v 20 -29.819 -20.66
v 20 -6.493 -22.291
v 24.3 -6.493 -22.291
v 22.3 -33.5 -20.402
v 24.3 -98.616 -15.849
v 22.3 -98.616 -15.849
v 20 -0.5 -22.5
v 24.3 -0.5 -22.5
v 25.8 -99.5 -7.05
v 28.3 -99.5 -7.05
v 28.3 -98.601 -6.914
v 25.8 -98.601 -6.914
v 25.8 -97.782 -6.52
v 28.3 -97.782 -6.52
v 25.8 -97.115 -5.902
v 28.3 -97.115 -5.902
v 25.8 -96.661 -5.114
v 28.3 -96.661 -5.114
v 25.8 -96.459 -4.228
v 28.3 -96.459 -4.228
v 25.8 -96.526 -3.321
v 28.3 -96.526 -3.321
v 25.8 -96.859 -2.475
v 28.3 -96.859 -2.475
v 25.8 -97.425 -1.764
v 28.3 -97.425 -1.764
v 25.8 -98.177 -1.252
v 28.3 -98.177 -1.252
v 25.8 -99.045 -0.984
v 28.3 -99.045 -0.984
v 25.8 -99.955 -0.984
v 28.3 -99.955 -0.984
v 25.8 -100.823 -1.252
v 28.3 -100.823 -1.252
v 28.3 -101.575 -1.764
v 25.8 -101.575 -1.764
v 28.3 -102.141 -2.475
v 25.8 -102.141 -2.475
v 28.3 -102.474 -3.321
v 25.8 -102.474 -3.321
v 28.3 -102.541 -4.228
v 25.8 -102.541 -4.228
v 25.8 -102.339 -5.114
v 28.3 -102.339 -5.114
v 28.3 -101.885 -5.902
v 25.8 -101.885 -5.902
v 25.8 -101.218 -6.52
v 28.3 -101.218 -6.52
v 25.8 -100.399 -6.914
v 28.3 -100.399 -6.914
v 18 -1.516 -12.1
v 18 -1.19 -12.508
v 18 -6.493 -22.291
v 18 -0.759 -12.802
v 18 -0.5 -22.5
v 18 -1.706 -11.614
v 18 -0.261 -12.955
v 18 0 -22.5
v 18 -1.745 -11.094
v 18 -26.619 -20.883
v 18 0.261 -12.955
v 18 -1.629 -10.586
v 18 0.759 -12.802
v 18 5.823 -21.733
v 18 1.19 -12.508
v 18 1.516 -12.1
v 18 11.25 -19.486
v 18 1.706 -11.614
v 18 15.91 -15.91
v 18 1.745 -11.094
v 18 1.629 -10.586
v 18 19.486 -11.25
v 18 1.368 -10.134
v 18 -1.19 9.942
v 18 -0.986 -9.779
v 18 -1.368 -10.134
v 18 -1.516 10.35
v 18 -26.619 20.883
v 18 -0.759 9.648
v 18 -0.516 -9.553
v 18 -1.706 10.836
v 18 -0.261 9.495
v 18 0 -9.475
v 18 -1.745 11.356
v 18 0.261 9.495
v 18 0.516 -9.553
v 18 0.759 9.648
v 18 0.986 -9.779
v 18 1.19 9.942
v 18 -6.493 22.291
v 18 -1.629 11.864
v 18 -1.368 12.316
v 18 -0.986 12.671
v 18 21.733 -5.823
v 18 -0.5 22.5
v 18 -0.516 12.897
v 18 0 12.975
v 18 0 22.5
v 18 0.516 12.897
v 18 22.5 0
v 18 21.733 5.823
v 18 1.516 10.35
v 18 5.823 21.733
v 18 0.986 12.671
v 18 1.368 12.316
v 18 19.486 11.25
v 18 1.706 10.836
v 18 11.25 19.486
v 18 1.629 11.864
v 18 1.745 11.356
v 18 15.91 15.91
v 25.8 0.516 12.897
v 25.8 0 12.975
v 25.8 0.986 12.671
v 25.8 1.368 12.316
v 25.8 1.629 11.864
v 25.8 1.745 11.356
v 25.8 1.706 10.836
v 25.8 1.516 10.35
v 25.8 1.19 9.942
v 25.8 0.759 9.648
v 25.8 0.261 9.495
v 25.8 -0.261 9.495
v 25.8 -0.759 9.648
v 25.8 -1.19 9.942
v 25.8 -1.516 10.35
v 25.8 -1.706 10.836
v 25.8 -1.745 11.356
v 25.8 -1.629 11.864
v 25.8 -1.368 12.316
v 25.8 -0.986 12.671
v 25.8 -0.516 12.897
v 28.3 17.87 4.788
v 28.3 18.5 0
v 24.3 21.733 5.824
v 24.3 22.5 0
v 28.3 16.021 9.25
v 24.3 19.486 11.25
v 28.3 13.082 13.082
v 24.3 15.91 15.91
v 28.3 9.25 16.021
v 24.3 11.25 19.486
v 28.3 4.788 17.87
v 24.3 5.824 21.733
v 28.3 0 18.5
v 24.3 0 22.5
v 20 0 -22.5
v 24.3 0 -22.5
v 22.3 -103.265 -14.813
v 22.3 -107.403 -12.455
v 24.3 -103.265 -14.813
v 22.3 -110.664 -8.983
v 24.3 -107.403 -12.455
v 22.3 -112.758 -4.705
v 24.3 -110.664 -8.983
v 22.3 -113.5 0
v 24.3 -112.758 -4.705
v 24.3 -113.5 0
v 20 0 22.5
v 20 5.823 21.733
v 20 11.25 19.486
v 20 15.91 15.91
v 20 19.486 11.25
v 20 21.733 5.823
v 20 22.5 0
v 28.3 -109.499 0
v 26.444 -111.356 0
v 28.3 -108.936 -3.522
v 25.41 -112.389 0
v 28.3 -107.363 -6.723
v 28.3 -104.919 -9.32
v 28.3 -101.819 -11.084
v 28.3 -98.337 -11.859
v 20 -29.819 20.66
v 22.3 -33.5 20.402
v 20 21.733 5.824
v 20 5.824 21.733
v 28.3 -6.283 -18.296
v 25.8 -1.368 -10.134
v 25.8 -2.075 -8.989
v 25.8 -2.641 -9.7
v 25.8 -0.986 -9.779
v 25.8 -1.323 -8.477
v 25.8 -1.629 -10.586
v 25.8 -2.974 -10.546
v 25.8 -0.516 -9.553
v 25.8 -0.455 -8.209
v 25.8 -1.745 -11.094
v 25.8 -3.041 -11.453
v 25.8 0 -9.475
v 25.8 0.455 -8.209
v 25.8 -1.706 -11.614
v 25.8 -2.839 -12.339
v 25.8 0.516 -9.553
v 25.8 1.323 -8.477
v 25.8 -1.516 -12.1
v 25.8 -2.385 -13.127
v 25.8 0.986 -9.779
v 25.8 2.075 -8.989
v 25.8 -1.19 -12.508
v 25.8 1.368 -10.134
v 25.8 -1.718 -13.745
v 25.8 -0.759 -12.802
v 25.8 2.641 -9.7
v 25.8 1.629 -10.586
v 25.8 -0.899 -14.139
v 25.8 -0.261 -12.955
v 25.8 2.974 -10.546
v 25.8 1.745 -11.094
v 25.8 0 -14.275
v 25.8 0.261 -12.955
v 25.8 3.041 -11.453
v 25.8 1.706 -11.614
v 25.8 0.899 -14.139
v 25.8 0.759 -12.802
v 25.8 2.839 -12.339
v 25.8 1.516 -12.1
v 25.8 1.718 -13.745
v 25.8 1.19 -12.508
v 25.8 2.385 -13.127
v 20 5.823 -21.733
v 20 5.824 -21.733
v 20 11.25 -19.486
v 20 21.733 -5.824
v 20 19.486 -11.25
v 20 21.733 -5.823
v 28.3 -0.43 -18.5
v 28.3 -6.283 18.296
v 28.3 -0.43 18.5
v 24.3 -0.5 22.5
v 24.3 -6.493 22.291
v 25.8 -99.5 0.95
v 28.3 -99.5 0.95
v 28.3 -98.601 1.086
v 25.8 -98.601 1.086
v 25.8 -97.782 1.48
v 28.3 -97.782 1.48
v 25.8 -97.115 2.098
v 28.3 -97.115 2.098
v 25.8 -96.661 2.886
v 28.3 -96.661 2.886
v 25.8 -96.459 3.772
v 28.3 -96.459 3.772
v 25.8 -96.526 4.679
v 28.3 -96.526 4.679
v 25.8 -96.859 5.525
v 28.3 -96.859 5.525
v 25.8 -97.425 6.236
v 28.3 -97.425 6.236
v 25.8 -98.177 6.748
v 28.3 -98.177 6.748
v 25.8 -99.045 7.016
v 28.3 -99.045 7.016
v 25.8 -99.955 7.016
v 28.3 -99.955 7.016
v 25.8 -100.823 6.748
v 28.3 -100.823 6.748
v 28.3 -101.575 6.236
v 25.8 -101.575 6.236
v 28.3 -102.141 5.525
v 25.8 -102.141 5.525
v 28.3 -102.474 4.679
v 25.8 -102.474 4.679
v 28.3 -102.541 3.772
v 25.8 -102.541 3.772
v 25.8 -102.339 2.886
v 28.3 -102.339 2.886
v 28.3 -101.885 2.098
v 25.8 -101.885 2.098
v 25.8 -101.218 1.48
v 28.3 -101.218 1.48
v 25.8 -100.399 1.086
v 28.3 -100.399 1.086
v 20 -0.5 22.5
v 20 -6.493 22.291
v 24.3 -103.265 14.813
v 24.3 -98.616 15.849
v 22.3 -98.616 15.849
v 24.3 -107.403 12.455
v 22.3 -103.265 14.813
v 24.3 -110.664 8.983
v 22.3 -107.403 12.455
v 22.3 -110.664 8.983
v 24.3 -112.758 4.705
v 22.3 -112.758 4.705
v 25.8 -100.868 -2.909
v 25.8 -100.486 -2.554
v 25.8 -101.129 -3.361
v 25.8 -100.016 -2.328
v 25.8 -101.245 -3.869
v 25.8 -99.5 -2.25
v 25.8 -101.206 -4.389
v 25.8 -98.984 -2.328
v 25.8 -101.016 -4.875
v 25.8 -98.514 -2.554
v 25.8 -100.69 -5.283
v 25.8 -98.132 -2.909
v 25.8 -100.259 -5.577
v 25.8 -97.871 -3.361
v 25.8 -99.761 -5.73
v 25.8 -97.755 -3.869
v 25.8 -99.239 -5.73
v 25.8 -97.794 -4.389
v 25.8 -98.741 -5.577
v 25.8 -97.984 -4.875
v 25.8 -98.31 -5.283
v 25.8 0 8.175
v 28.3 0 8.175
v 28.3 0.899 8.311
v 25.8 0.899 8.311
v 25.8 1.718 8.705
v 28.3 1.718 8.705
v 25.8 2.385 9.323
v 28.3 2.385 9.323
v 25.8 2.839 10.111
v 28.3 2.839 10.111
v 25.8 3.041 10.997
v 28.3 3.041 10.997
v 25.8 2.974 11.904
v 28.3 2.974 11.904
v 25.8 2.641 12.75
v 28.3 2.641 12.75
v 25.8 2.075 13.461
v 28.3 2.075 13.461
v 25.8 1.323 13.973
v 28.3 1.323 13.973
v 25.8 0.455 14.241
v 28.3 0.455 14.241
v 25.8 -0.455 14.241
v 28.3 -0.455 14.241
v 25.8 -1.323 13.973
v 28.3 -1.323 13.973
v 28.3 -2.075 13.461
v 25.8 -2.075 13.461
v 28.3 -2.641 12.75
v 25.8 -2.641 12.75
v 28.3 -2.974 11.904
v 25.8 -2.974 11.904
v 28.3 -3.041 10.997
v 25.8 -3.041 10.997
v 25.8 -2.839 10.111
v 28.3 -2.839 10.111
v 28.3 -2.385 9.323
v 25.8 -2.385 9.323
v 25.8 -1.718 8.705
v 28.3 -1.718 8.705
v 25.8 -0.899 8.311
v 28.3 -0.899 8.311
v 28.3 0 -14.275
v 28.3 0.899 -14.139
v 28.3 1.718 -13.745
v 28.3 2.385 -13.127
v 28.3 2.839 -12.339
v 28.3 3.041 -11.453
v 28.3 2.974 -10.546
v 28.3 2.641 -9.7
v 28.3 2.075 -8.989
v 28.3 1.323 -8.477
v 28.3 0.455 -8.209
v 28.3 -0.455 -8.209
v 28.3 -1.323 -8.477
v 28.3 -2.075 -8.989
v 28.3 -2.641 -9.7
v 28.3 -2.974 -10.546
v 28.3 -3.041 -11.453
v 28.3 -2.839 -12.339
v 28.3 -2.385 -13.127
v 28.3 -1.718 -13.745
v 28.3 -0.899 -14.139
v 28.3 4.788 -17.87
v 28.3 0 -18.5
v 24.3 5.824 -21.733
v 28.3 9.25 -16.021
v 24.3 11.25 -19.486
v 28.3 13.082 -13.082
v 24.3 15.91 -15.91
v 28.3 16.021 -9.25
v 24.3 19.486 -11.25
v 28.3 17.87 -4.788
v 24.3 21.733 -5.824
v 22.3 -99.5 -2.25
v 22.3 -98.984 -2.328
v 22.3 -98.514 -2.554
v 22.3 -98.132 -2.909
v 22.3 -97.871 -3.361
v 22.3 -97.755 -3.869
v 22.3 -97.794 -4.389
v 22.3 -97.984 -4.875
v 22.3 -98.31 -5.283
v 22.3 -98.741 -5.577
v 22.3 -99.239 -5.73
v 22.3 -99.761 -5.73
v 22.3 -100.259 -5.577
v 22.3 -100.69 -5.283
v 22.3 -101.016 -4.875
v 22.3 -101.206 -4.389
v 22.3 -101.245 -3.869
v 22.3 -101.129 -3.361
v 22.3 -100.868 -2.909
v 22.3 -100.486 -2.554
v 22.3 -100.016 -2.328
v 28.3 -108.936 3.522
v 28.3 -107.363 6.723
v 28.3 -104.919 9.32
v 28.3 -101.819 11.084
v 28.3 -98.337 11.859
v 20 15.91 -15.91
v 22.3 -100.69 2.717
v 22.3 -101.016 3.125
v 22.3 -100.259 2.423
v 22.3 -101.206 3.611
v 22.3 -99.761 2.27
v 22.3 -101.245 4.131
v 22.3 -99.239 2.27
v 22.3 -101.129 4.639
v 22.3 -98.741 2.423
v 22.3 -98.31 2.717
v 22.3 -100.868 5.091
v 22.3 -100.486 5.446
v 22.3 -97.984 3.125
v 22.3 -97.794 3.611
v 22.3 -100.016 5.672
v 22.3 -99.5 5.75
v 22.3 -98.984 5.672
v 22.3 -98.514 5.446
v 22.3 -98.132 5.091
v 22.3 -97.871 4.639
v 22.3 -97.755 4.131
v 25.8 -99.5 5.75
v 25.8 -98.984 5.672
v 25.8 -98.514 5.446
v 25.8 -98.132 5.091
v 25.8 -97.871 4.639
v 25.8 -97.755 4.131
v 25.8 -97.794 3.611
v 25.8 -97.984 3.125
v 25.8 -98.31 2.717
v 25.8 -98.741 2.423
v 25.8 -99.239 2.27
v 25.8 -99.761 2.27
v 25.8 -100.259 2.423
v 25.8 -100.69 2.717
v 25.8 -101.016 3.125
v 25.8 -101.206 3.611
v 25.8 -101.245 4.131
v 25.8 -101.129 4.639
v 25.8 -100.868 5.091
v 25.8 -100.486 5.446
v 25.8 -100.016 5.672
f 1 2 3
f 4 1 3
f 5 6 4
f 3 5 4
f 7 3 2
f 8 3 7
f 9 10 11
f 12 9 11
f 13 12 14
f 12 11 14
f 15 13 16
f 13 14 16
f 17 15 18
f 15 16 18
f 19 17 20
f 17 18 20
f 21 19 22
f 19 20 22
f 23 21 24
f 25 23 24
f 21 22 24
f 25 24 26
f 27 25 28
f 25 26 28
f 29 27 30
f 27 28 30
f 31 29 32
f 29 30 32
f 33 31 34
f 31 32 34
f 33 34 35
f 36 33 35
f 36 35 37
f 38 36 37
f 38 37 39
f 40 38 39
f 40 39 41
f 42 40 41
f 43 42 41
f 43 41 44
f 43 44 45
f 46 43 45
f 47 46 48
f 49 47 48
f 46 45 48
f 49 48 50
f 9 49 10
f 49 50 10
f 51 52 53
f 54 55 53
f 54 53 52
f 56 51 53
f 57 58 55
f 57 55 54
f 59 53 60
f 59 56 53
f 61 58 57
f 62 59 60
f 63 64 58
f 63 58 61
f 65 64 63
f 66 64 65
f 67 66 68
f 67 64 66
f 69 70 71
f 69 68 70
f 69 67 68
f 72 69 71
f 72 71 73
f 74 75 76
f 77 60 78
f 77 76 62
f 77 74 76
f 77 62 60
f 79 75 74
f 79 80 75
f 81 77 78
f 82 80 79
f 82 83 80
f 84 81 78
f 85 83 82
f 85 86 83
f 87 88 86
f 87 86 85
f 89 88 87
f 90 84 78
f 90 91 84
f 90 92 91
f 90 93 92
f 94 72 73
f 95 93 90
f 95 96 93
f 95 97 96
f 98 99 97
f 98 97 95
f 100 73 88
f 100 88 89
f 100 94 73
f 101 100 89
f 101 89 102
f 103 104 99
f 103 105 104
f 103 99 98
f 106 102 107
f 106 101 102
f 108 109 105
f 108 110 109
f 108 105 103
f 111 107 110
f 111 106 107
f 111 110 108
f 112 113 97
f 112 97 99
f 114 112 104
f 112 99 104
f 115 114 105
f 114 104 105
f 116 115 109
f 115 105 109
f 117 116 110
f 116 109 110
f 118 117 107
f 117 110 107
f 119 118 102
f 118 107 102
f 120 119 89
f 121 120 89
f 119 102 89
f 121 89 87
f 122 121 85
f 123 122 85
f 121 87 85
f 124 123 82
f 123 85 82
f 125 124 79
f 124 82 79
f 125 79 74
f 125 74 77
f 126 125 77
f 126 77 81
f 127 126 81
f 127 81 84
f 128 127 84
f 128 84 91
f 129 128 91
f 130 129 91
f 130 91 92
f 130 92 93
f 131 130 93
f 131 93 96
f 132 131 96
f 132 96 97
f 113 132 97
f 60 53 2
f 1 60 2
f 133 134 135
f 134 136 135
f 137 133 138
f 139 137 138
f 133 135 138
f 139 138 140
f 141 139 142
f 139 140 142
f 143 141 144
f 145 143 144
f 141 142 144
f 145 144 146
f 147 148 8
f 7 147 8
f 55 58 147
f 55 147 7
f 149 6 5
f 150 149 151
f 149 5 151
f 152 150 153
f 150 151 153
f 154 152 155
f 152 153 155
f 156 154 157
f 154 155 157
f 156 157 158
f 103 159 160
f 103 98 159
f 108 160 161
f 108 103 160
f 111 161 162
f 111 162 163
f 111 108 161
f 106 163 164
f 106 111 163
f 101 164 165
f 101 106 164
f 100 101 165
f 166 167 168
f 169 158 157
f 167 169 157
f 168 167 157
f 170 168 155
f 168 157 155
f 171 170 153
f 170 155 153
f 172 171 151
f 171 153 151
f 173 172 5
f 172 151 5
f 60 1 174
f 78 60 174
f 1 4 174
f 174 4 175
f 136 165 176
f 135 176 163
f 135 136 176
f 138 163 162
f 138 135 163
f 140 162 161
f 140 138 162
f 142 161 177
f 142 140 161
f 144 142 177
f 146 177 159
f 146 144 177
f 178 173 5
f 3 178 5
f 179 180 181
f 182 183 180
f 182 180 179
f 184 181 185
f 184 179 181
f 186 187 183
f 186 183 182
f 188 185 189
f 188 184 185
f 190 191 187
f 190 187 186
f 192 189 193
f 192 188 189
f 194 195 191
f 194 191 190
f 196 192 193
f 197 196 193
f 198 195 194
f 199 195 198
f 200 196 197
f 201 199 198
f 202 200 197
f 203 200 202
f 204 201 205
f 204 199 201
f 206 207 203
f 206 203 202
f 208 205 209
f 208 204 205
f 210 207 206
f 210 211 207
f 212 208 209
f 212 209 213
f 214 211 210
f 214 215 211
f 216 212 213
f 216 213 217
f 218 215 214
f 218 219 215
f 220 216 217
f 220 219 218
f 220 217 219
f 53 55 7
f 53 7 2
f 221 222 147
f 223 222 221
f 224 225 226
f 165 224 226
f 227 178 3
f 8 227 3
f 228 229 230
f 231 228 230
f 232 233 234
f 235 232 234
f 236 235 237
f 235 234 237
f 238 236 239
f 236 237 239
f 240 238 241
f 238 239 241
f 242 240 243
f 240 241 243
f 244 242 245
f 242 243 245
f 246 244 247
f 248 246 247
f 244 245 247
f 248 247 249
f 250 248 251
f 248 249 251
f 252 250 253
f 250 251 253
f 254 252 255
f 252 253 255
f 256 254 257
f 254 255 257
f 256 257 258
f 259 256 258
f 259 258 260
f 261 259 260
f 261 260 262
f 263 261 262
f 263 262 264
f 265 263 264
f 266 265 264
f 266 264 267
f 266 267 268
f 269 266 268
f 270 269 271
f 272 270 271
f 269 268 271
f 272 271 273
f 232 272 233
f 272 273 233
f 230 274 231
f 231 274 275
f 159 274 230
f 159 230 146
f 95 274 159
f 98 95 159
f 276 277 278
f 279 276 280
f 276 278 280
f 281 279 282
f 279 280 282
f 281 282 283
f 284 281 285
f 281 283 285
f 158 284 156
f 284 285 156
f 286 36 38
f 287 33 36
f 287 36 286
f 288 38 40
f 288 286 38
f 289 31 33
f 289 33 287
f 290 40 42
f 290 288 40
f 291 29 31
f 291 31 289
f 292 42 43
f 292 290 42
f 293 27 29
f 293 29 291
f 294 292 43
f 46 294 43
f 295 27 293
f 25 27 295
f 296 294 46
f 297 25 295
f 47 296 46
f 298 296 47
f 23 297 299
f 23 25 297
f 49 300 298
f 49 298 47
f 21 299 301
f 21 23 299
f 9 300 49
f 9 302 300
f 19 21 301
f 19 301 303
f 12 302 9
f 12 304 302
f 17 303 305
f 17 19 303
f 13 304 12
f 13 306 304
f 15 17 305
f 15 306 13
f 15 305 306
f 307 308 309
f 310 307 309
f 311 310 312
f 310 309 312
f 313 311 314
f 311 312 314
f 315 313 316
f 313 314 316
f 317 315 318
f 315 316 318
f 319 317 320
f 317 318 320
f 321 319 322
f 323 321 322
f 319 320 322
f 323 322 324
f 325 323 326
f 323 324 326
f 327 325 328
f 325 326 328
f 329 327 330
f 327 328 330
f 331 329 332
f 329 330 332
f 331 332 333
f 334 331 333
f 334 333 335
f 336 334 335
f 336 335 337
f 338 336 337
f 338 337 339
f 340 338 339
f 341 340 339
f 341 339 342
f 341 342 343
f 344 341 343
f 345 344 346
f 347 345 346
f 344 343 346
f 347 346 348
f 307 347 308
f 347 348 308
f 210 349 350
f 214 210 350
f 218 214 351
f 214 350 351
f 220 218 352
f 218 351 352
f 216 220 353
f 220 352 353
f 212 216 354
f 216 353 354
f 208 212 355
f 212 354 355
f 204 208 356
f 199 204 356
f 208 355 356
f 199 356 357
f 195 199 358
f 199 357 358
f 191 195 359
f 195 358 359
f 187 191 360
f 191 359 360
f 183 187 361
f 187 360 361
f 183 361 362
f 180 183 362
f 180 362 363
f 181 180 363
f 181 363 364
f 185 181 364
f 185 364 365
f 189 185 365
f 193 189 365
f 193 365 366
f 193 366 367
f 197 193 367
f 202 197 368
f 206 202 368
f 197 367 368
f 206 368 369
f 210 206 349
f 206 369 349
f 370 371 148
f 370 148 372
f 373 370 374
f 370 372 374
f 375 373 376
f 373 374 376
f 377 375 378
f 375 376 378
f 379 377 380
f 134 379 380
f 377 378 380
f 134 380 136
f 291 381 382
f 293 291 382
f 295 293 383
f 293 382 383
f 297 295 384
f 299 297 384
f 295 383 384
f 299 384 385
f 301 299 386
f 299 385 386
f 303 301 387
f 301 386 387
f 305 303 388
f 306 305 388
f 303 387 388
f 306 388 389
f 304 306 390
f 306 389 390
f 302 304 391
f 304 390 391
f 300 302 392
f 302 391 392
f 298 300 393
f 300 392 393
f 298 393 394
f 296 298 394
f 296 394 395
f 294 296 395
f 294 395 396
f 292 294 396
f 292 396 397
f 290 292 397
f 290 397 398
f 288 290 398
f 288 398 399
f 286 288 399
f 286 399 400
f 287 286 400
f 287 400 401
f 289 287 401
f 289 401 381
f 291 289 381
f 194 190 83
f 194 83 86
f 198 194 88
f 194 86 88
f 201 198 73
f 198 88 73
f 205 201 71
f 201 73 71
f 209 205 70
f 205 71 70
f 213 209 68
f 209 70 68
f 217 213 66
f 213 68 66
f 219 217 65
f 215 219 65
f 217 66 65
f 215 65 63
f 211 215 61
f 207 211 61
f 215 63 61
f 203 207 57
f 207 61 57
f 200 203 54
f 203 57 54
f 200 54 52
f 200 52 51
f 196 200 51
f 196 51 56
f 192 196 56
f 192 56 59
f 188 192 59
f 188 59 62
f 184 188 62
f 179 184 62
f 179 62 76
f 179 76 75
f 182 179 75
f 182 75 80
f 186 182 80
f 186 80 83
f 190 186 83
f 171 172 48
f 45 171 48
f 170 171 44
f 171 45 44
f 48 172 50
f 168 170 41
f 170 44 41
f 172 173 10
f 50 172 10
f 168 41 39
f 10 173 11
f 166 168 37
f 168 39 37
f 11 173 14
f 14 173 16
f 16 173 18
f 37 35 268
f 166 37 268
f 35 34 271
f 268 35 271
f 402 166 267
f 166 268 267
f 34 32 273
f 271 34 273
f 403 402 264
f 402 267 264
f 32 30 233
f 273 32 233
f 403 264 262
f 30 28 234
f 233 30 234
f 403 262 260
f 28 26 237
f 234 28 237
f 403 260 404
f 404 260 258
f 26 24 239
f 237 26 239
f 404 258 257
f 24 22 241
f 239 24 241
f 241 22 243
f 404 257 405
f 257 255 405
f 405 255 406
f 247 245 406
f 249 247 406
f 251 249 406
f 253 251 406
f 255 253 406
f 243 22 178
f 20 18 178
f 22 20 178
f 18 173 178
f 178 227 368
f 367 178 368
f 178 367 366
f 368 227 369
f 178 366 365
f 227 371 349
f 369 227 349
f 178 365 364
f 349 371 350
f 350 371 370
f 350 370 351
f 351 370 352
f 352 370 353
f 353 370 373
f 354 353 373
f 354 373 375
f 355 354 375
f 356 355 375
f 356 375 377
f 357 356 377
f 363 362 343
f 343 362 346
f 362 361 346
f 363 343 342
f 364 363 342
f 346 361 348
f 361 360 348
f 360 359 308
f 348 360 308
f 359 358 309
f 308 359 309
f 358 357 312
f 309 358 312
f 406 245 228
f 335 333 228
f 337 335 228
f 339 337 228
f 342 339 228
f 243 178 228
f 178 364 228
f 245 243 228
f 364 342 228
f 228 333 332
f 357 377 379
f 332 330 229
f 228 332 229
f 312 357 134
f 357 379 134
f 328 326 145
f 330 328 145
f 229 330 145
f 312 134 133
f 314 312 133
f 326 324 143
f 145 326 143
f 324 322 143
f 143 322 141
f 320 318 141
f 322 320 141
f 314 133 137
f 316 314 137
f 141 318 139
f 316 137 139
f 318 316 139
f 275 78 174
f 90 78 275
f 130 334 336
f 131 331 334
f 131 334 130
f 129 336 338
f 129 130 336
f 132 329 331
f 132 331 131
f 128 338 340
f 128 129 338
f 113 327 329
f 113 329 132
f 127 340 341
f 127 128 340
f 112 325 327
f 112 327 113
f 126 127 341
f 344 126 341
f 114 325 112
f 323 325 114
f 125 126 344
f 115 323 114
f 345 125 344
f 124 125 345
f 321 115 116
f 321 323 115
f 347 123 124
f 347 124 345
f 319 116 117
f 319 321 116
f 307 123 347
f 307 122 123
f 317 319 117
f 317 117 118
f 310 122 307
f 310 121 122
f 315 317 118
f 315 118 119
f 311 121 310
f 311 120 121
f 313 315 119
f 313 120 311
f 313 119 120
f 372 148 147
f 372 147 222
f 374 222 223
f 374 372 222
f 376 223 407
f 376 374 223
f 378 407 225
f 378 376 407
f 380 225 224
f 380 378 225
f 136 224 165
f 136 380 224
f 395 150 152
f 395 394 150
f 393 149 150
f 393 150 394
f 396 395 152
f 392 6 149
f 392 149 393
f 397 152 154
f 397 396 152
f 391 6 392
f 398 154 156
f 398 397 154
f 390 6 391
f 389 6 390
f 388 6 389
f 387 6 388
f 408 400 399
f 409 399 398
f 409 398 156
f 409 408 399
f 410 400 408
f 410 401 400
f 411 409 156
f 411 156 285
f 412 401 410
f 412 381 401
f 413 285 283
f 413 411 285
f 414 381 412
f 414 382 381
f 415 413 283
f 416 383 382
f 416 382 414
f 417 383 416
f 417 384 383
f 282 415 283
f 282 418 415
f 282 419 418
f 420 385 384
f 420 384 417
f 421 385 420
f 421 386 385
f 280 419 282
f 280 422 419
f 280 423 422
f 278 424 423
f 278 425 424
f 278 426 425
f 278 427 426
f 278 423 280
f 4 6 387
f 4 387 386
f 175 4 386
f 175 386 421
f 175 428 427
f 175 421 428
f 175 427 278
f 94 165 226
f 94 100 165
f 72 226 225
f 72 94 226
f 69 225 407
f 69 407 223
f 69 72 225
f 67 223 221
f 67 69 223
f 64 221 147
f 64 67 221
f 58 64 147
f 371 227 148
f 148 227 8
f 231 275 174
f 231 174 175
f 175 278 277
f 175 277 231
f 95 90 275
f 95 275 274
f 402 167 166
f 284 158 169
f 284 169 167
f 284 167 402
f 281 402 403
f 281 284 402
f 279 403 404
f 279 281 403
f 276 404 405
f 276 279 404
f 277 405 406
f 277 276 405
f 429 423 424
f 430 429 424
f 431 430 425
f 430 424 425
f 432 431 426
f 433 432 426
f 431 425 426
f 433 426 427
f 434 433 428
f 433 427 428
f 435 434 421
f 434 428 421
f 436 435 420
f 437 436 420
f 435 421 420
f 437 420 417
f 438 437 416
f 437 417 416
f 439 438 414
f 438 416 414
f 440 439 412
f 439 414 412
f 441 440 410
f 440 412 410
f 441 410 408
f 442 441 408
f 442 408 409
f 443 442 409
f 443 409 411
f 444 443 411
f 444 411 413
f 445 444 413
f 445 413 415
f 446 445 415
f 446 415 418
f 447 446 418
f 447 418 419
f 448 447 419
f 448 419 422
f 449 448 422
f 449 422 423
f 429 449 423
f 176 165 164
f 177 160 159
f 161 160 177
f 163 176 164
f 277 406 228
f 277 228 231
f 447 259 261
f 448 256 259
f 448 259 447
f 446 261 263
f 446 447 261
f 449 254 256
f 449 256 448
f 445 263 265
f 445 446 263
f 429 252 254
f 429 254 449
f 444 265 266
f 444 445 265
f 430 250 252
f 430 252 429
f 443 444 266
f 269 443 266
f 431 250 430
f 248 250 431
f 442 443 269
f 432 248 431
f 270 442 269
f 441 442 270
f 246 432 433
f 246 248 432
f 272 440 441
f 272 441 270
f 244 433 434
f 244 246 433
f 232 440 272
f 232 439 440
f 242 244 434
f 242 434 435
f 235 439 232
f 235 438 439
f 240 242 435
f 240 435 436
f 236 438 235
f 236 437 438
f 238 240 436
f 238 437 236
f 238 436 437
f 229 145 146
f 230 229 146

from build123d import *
from OCP.BRepFilletAPI import BRepFilletAPI_MakeChamfer

# Parameters (mm, degrees)
SKETCH1_W           = 20
SKETCH1_H           = 20
BOSS_EXTRUDE1_DEPTH = 20
SKETCH2_W           = 45
SKETCH2_H           = 70
BOSS_EXTRUDE2_DEPTH = 8.3
CUT_EXTRUDE1_DEPTH  = 5.8
FILLET1_R           = 3.6
FILLET2_R           = 10
SKETCH5_R           = 3.9
CUT_EXTRUDE2_DEPTH  = 51.320373608
CUT_EXTRUDE3_REACH  = 49.302
SKETCH6_R           = 1.75
SKETCH13_W          = 20
SKETCH13_H          = 20
CUT_EXTRUDE9_DEPTH  = 20
SKETCH15_W          = 8.3
SKETCH15_H          = 45
CUT_EXTRUDE10_DEPTH = 12.5
SKETCH18_W          = 8.3
SKETCH18_H          = 45
BOSS_EXTRUDE4_DEPTH = 78.5
FILLET5_R           = 22.5
SKETCH20_W          = 45
SKETCH20_H          = 80
CUT_EXTRUDE12_DEPTH = 2.3
CHAMFER2_SIZE       = 110
CHAMFER2_SIZE2      = 7.691949314
CHAMFER3_SIZE       = 3
FILLET6_R           = 16
CHAMFER4_SIZE       = 4
SKETCH21_R          = 1.75
CUT_EXTRUDE15_DEPTH = 116.863759268
SKETCH14_R          = 1.75
CUT_EXTRUDE16_DEPTH = 117.005606381
SKETCH23_W          = 17
SKETCH23_H          = 38.9
BOSS_EXTRUDE5_DEPTH = 8.3
BOSS_EXTRUDE6_START = 2
SKETCH24_R          = 1.75
BOSS_EXTRUDE6_DEPTH = 2
CHAMFER5_SIZE2      = 4.3
CHAMFER5_SIZE       = 6.881438475
SKETCH25_R          = 3.05
CUT_EXTRUDE17_DEPTH = 2.5


# Some blends are built 0.0001 mm under size
with BuildPart() as part:
    # Sketch1 → Boss-Extrude1 (new body)
    with BuildSketch(Plane(origin=(0, 0, 0), x_dir=(0, 0, -1), z_dir=(1, 0, 0))):
        Rectangle(SKETCH1_W, SKETCH1_H)
    extrude(amount=BOSS_EXTRUDE1_DEPTH)

    # Sketch2 → Boss-Extrude2 (add)
    with BuildSketch(Plane(origin=(20, 0, 0), x_dir=(0, 0, -1), z_dir=(1, 0, 0))):
        Rectangle(SKETCH2_W, SKETCH2_H)
    extrude(amount=BOSS_EXTRUDE2_DEPTH)

    # Sketch4 → Cut-Extrude1 (cut)
    with BuildSketch(Plane(origin=(28.3, 0, 0), x_dir=(0, 0, -1), z_dir=(1, 0, 0))):
        with BuildLine():
            Line((3.6, -28.55), (-3.6, -28.55))
            Line((-3.6, -28.55), (-3.6, -7.311805523))
            ThreePointArc((-3.6, -7.311805523), (0, 8.15), (3.6, -7.311805523))
            Line((3.6, -7.311805523), (3.6, -28.55))
        make_face()
    extrude(amount=-CUT_EXTRUDE1_DEPTH, mode=Mode.SUBTRACT)

    # Fillet1
    fillet1_edges = [part.edges().sort_by_distance(p)[0] for p in [
        (25.4, -28.55, 3.6),
        (25.4, -28.55, -3.6),
    ]]
    fillet(fillet1_edges, radius=FILLET1_R - 0.0001)  # a hair under: the kernel refuses the full size

    # Fillet2
    fillet2_edges = [part.edges().sort_by_distance(p)[0] for p in [
        (25.4, -7.311805523, 3.6),
        (25.4, -7.311805523, -3.6),
    ]]
    fillet(fillet2_edges, radius=FILLET2_R)

    # Sketch5 → Cut-Extrude2 (cut, through all)
    with BuildSketch(Plane.ZY):
        Circle(SKETCH5_R)
    extrude(amount=-CUT_EXTRUDE2_DEPTH, mode=Mode.SUBTRACT)

    # Sketch6 → Cut-Extrude3 (cut, up to next)
    with BuildSketch(Plane(origin=(22.5, 0, 0), x_dir=(0, 0, -1), z_dir=(1, 0, 0)), mode=Mode.PRIVATE) as cut_extrude3_sk1:
        with Locations((0, -20.6)):
            Circle(SKETCH6_R)
    cut_extrude3_tool1 = extrude(cut_extrude3_sk1.sketch, amount=-CUT_EXTRUDE3_REACH, mode=Mode.PRIVATE) & part.part
    # Sketch6 → Cut-Extrude3 (cut, up to next)
    with BuildSketch(Plane(origin=(22.5, 0, 0), x_dir=(0, 0, -1), z_dir=(1, 0, 0)), mode=Mode.PRIVATE) as cut_extrude3_sk2:
        with Locations((0, -9.35)):
            Circle(SKETCH6_R)
    cut_extrude3_tool2 = extrude(cut_extrude3_sk2.sketch, amount=-CUT_EXTRUDE3_REACH, mode=Mode.PRIVATE) & part.part
    add(cut_extrude3_tool1.solids().sort_by_distance((22.5, -20.6, 0))[0], mode=Mode.SUBTRACT)
    add(cut_extrude3_tool2.solids().sort_by_distance((22.5, -9.35, 0))[0], mode=Mode.SUBTRACT)

    # Sketch13 → Cut-Extrude9 (cut)
    with BuildSketch(Plane.ZY):
        Rectangle(SKETCH13_W, SKETCH13_H)
    extrude(amount=-CUT_EXTRUDE9_DEPTH, mode=Mode.SUBTRACT)

    # Sketch15 → Cut-Extrude10 (cut)
    with BuildSketch(Plane(origin=(0, 35, 0), x_dir=(1, 0, 0), z_dir=(0, 1, 0))):
        with Locations((24.15, 0)):
            Rectangle(SKETCH15_W, SKETCH15_H)
    extrude(amount=-CUT_EXTRUDE10_DEPTH, mode=Mode.SUBTRACT)

    # Sketch18 → Boss-Extrude4 (add)
    with BuildSketch(Plane.XZ.offset(35)):
        with Locations((24.15, 0)):
            Rectangle(SKETCH18_W, SKETCH18_H)
    extrude(amount=BOSS_EXTRUDE4_DEPTH)

    # Fillet5
    fillet5_edges = [part.edges().sort_by_distance(p)[0] for p in [
        (24.15, 22.5, -22.5),
        (24.15, 22.5, 22.5),
    ]]
    fillet(fillet5_edges, radius=FILLET5_R - 0.0001)  # a hair under: the kernel refuses the full size

    # Sketch20 → Cut-Extrude12 (cut)
    with BuildSketch(Plane.ZY.offset(-20)):
        with Locations((0, -73.5)):
            Rectangle(SKETCH20_W, SKETCH20_H)
    extrude(amount=-CUT_EXTRUDE12_DEPTH, mode=Mode.SUBTRACT)

    # Chamfer2: one chamfer whose edges measure the first distance from different faces: ONE call of the kernel's chamfer builder (chamfer() names one face for all edges)
    chamfer2_edges_1 = [part.edges().sort_by_distance(p)[0] for p in [
        (25.3, -113.5, -22.5),
    ]]
    chamfer2_side_1 = [part.faces().sort_by_distance(p)[0] for p in [
        (24.878183359, -52.68424744, -22.5),
    ]]
    chamfer2_edges_2 = [part.edges().sort_by_distance(p)[0] for p in [
        (25.3, -113.5, 22.5),
    ]]
    chamfer2_side_2 = [part.faces().sort_by_distance(p)[0] for p in [
        (24.878183359, -52.68424744, 22.5),
    ]]
    chamfer2 = BRepFilletAPI_MakeChamfer(part.part.solid().wrapped)
    for e in chamfer2_edges_1:
        chamfer2.Add(CHAMFER2_SIZE, CHAMFER2_SIZE2, e.wrapped, chamfer2_side_1[0].wrapped)  # the first distance lies on this face
    for e in chamfer2_edges_2:
        chamfer2.Add(CHAMFER2_SIZE, CHAMFER2_SIZE2, e.wrapped, chamfer2_side_2[0].wrapped)  # the first distance lies on this face
    add(Compound.cast(chamfer2.Shape()), mode=Mode.REPLACE)

    # Chamfer3
    # the kernel refuses this chamfer: 3 mm, written as the material it takes off along each edge
    with BuildSketch(Plane(origin=(36.099824275, -3.5, -22.5), x_dir=(0, -0.9976567869548854, 0.06841736214481542), z_dir=(-1, 0, 0))) as chamfer3_piece_1:
        Polygon((CHAMFER3_SIZE * 0.99999909909, CHAMFER3_SIZE * 0.00134231857559), (-CHAMFER3_SIZE * 0.997656786955, CHAMFER3_SIZE * 0.0684173621448), (0, 0), align=None)
    extrude(amount=23.89964855, mode=Mode.SUBTRACT)
    with BuildSketch(Plane(origin=(12.200175725, -3.5, 22.5), x_dir=(0, 0.999999099090015, 0.0013423185755924486), z_dir=(1, 0, 0))) as chamfer3_piece_2:
        Polygon((CHAMFER3_SIZE * 0.99999909909, -CHAMFER3_SIZE * 0.00134231857559), (-CHAMFER3_SIZE * 0.997656786955, -CHAMFER3_SIZE * 0.0684173621448), (0, 0), align=None)
    extrude(amount=23.89964855, mode=Mode.SUBTRACT)

    # Fillet6
    # the kernel refuses this fillet: 16 mm, written as the material it takes off along each edge
    with BuildSketch(Plane(origin=(65.600603446, -113.5, -14.808050686), x_dir=(0, 0, 1), z_dir=(-1, 0, 0))) as fillet6_piece_1:
        with BuildLine():
            CenterArc((FILLET6_R * 0.932515086138, FILLET6_R), FILLET6_R, 184, 86)
            Line((-FILLET6_R * 0.0650489641222, FILLET6_R * 0.930243526256), (0, 0))
            Line((0, 0), (FILLET6_R * 0.932515086138, 0))
        make_face()
    extrude(amount=80.601206891, mode=Mode.SUBTRACT)
    with BuildSketch(Plane(origin=(-15.000603446, -113.5, 14.808050686), x_dir=(0, 0.9975640502598242, 0.06975647374412544), z_dir=(1, 0, 0))) as fillet6_piece_2:
        with BuildLine():
            CenterArc((FILLET6_R * 0.932515086138, -FILLET6_R), FILLET6_R, 90, 86)
            Line((-FILLET6_R * 0.0650489641222, -FILLET6_R * 0.930243526256), (0, 0))
            Line((0, 0), (FILLET6_R * 0.932515086138, 0))
        make_face()
    extrude(amount=80.601206891, mode=Mode.SUBTRACT)

    # Chamfer4
    # the kernel refuses this chamfer: 4 mm, written as the material it takes off along each edge
    with BuildSketch(Plane(origin=(28.3, 0.0001, 22.5), x_dir=(0.02749587661058735, 0, -0.9996219169112968), z_dir=(0, -1, 0)), Plane(origin=(28.3, -10.786731952, -22.5), x_dir=(0.027495876610586487, 0, 0.9996219169112968), z_dir=(0, 1, 0))) as chamfer4_piece_1:
        Polygon((CHAMFER4_SIZE * 0.999621916911, -CHAMFER4_SIZE * 0.0274958766106), (-CHAMFER4_SIZE * 0.0274958766106, -CHAMFER4_SIZE * 0.999621916911), (0, 0), align=None)
    extrude(amount=10.786831952, mode=Mode.SUBTRACT)
    with BuildSketch(Plane(origin=(28.3, 0.0001, 0.0001), x_dir=(0, 1, 0), z_dir=(0, 0, -1))) as chamfer4_piece_2:
        Polygon((22.4999 - CHAMFER4_SIZE, 0), (22.4999, -CHAMFER4_SIZE), (22.4999, 0), align=None)
    revolve(axis=Axis((28.3, 0.0001, 0.0001), (1, 0, 0)), revolution_arc=90, mode=Mode.SUBTRACT)
    with BuildSketch(Plane(origin=(28.3, 0.0001, -0.0001), x_dir=(0, 0, -1), z_dir=(0, -1, 0))) as chamfer4_piece_3:
        Polygon((22.4999 - CHAMFER4_SIZE, 0), (22.4999, -CHAMFER4_SIZE), (22.4999, 0), align=None)
    revolve(axis=Axis((28.3, 0.0001, -0.0001), (1, 0, 0)), revolution_arc=90, mode=Mode.SUBTRACT)
    with BuildSketch(Plane(origin=(28.3, 3.768981839, 23.008296726), x_dir=(0.027495876610586473, 0.06973010000107531, -0.9971868881625227), z_dir=(0, -0.9975640502598243, -0.06975647374412554))) as chamfer4_piece_4:
        Polygon((CHAMFER4_SIZE * 0.999621916911, -CHAMFER4_SIZE * 0.0274958766106), (-CHAMFER4_SIZE * 0.0274958766106, -CHAMFER4_SIZE * 0.999621916911), (0, 0), align=None)
    extrude(amount=102.635099363, mode=Mode.SUBTRACT)
    with BuildSketch(Plane(origin=(28.3, 9.780465553, -22.859001768), x_dir=(0.027495876610586487, 0.03488630179317817, 0.9990129742483882), z_dir=(0, -0.9993908270190893, 0.03489949670268572))) as chamfer4_piece_5:
        Polygon((CHAMFER4_SIZE * 0.999621916911, CHAMFER4_SIZE * 0.0274958766106), (-CHAMFER4_SIZE * 0.0274958766106, CHAMFER4_SIZE * 0.999621916911), (0, 0), align=None)
    extrude(amount=26.569808866, mode=Mode.SUBTRACT)
    with BuildSketch(Plane(origin=(28.3, 9.780465553, 22.859001768), x_dir=(0.027495876610586494, 0.034886301793392936, -0.9990129742483806), z_dir=(0, -0.9993908270190818, -0.03489949670290056))) as chamfer4_piece_6:
        Polygon((CHAMFER4_SIZE * 0.999621916911, -CHAMFER4_SIZE * 0.0274958766106), (-CHAMFER4_SIZE * 0.0274958766106, -CHAMFER4_SIZE * 0.999621916911), (0, 0), align=None)
    extrude(amount=26.569808866, mode=Mode.SUBTRACT)
    with BuildSketch(Plane(origin=(28.3, 3.768981839, -23.008296726), x_dir=(0.027495876610586473, 0.06973010000107512, 0.9971868881625227), z_dir=(0, -0.9975640502598243, 0.06975647374412534))) as chamfer4_piece_7:
        Polygon((CHAMFER4_SIZE * 0.999621916911, CHAMFER4_SIZE * 0.0274958766106), (-CHAMFER4_SIZE * 0.0274958766106, CHAMFER4_SIZE * 0.999621916911), (0, 0), align=None)
    extrude(amount=102.635099363, mode=Mode.SUBTRACT)
    with BuildSketch(Plane(origin=(28.3, -97.5, -0.112190692), x_dir=(0, -0.9999754161991546, 0.007011918234514749), z_dir=(0, -0.007011918234514749, -0.9999754161991546))) as chamfer4_piece_8:
        Polygon((16 - CHAMFER4_SIZE, 0), (16, CHAMFER4_SIZE), (16, 0), align=None)
    revolve(axis=Axis((28.3, -97.5, -0.112190692), (-1, 0, 0)), revolution_arc=85.598243387, mode=Mode.SUBTRACT)
    with BuildSketch(Plane(origin=(28.3, -97.5, 0.112190692), x_dir=(0, -0.9999754161989443, -0.0070119182645099615), z_dir=(0, -0.0070119182645099615, 0.9999754161989443))) as chamfer4_piece_9:
        Polygon((16 - CHAMFER4_SIZE, 0), (16, -CHAMFER4_SIZE), (16, 0), align=None)
    revolve(axis=Axis((28.3, -97.5, 0.112190692), (1, 0, 0)), revolution_arc=85.598243385, mode=Mode.SUBTRACT)
    with BuildSketch(Plane(origin=(28.3, 22.5, -0.0001), x_dir=(0.027495876610588214, -0.9996219169112968, 0), z_dir=(0, 0, 1))) as chamfer4_piece_10:
        Polygon((CHAMFER4_SIZE * 0.999621916911, -CHAMFER4_SIZE * 0.0274958766106), (-CHAMFER4_SIZE * 0.0274958766106, -CHAMFER4_SIZE * 0.999621916911), (0, 0), align=None)
    extrude(amount=0.0002, mode=Mode.SUBTRACT)

    # Sketch21 → Cut-Extrude15 (cut, through all)
    with BuildSketch(Plane.ZY.offset(-22.3)):
        with Locations((-4, -99.5)):
            Circle(SKETCH21_R)
        with Locations((4, -99.5)):
            Circle(SKETCH21_R)
    extrude(amount=-CUT_EXTRUDE15_DEPTH, mode=Mode.SUBTRACT)

    # Sketch14 → Cut-Extrude16 (cut, through all)
    with BuildSketch(Plane.ZY.offset(-20)):
        with Locations((-11.225, 0)):
            Circle(SKETCH14_R)
        with Locations((11.225, 0)):
            Circle(SKETCH14_R)
    extrude(amount=-CUT_EXTRUDE16_DEPTH, mode=Mode.SUBTRACT)

    # Sketch23 → Boss-Extrude5 (add, through all)
    with BuildSketch(Plane(origin=(28.3, 0, 0), x_dir=(0, 0, -1), z_dir=(1, 0, 0))):
        with Locations((0, -10.55)):
            Rectangle(SKETCH23_W, SKETCH23_H)
    extrude(amount=-BOSS_EXTRUDE5_DEPTH)

    # Sketch24 → Boss-Extrude6 (add)
    with BuildSketch(Plane.ZY.offset(-20).offset(BOSS_EXTRUDE6_START)):
        with BuildLine():
            Line((20.402195642, -33.5), (22.290730579, -6.492692151))
            Line((22.290730579, -6.492692151), (22.5, -0.5))
            Line((22.5, -0.5), (22.5, 0))
            ThreePointArc((22.5, 0), (15.909902577, 15.909902577), (0, 22.5))
            ThreePointArc((0, 22.5), (-15.909902577, 15.909902577), (-22.5, 0))
            Line((-22.5, 0), (-22.5, -0.5))
            Line((-22.5, -0.5), (-22.290730579, -6.492692151))
            Line((-22.290730579, -6.492692151), (-20.402195642, -33.5))
            Line((-20.402195642, -33.5), (20.402195642, -33.5))
        make_face()
        with Locations((11.225, 0)):
            Circle(SKETCH24_R, mode=Mode.SUBTRACT)
        with Locations((-11.225, 0)):
            Circle(SKETCH24_R, mode=Mode.SUBTRACT)
    extrude(amount=-BOSS_EXTRUDE6_DEPTH)

    # Chamfer5
    chamfer5_edges = [part.edges().sort_by_distance(p)[0] for p in [
        (18, -33.5, 0),
    ]]
    chamfer5_side = [part.faces().sort_by_distance(p)[0] for p in [
        (18, -33.414, 0),
    ]]
    chamfer(chamfer5_edges, length=CHAMFER5_SIZE - 0.0001, length2=CHAMFER5_SIZE2 - 0.0001, reference=chamfer5_side[0])  # a hair under: the kernel refuses the full size

    # Sketch25 → Cut-Extrude17 (cut)
    with BuildSketch(Plane(origin=(28.3, 0, 0), x_dir=(0, 0, -1), z_dir=(1, 0, 0))):
        with Locations((-11.225, 0)):
            Circle(SKETCH25_R)
        with Locations((11.225, 0)):
            Circle(SKETCH25_R)
        with Locations((-4, -99.5)):
            Circle(SKETCH25_R)
        with Locations((4, -99.5)):
            Circle(SKETCH25_R)
    extrude(amount=-CUT_EXTRUDE17_DEPTH, mode=Mode.SUBTRACT)


solid = part.part
